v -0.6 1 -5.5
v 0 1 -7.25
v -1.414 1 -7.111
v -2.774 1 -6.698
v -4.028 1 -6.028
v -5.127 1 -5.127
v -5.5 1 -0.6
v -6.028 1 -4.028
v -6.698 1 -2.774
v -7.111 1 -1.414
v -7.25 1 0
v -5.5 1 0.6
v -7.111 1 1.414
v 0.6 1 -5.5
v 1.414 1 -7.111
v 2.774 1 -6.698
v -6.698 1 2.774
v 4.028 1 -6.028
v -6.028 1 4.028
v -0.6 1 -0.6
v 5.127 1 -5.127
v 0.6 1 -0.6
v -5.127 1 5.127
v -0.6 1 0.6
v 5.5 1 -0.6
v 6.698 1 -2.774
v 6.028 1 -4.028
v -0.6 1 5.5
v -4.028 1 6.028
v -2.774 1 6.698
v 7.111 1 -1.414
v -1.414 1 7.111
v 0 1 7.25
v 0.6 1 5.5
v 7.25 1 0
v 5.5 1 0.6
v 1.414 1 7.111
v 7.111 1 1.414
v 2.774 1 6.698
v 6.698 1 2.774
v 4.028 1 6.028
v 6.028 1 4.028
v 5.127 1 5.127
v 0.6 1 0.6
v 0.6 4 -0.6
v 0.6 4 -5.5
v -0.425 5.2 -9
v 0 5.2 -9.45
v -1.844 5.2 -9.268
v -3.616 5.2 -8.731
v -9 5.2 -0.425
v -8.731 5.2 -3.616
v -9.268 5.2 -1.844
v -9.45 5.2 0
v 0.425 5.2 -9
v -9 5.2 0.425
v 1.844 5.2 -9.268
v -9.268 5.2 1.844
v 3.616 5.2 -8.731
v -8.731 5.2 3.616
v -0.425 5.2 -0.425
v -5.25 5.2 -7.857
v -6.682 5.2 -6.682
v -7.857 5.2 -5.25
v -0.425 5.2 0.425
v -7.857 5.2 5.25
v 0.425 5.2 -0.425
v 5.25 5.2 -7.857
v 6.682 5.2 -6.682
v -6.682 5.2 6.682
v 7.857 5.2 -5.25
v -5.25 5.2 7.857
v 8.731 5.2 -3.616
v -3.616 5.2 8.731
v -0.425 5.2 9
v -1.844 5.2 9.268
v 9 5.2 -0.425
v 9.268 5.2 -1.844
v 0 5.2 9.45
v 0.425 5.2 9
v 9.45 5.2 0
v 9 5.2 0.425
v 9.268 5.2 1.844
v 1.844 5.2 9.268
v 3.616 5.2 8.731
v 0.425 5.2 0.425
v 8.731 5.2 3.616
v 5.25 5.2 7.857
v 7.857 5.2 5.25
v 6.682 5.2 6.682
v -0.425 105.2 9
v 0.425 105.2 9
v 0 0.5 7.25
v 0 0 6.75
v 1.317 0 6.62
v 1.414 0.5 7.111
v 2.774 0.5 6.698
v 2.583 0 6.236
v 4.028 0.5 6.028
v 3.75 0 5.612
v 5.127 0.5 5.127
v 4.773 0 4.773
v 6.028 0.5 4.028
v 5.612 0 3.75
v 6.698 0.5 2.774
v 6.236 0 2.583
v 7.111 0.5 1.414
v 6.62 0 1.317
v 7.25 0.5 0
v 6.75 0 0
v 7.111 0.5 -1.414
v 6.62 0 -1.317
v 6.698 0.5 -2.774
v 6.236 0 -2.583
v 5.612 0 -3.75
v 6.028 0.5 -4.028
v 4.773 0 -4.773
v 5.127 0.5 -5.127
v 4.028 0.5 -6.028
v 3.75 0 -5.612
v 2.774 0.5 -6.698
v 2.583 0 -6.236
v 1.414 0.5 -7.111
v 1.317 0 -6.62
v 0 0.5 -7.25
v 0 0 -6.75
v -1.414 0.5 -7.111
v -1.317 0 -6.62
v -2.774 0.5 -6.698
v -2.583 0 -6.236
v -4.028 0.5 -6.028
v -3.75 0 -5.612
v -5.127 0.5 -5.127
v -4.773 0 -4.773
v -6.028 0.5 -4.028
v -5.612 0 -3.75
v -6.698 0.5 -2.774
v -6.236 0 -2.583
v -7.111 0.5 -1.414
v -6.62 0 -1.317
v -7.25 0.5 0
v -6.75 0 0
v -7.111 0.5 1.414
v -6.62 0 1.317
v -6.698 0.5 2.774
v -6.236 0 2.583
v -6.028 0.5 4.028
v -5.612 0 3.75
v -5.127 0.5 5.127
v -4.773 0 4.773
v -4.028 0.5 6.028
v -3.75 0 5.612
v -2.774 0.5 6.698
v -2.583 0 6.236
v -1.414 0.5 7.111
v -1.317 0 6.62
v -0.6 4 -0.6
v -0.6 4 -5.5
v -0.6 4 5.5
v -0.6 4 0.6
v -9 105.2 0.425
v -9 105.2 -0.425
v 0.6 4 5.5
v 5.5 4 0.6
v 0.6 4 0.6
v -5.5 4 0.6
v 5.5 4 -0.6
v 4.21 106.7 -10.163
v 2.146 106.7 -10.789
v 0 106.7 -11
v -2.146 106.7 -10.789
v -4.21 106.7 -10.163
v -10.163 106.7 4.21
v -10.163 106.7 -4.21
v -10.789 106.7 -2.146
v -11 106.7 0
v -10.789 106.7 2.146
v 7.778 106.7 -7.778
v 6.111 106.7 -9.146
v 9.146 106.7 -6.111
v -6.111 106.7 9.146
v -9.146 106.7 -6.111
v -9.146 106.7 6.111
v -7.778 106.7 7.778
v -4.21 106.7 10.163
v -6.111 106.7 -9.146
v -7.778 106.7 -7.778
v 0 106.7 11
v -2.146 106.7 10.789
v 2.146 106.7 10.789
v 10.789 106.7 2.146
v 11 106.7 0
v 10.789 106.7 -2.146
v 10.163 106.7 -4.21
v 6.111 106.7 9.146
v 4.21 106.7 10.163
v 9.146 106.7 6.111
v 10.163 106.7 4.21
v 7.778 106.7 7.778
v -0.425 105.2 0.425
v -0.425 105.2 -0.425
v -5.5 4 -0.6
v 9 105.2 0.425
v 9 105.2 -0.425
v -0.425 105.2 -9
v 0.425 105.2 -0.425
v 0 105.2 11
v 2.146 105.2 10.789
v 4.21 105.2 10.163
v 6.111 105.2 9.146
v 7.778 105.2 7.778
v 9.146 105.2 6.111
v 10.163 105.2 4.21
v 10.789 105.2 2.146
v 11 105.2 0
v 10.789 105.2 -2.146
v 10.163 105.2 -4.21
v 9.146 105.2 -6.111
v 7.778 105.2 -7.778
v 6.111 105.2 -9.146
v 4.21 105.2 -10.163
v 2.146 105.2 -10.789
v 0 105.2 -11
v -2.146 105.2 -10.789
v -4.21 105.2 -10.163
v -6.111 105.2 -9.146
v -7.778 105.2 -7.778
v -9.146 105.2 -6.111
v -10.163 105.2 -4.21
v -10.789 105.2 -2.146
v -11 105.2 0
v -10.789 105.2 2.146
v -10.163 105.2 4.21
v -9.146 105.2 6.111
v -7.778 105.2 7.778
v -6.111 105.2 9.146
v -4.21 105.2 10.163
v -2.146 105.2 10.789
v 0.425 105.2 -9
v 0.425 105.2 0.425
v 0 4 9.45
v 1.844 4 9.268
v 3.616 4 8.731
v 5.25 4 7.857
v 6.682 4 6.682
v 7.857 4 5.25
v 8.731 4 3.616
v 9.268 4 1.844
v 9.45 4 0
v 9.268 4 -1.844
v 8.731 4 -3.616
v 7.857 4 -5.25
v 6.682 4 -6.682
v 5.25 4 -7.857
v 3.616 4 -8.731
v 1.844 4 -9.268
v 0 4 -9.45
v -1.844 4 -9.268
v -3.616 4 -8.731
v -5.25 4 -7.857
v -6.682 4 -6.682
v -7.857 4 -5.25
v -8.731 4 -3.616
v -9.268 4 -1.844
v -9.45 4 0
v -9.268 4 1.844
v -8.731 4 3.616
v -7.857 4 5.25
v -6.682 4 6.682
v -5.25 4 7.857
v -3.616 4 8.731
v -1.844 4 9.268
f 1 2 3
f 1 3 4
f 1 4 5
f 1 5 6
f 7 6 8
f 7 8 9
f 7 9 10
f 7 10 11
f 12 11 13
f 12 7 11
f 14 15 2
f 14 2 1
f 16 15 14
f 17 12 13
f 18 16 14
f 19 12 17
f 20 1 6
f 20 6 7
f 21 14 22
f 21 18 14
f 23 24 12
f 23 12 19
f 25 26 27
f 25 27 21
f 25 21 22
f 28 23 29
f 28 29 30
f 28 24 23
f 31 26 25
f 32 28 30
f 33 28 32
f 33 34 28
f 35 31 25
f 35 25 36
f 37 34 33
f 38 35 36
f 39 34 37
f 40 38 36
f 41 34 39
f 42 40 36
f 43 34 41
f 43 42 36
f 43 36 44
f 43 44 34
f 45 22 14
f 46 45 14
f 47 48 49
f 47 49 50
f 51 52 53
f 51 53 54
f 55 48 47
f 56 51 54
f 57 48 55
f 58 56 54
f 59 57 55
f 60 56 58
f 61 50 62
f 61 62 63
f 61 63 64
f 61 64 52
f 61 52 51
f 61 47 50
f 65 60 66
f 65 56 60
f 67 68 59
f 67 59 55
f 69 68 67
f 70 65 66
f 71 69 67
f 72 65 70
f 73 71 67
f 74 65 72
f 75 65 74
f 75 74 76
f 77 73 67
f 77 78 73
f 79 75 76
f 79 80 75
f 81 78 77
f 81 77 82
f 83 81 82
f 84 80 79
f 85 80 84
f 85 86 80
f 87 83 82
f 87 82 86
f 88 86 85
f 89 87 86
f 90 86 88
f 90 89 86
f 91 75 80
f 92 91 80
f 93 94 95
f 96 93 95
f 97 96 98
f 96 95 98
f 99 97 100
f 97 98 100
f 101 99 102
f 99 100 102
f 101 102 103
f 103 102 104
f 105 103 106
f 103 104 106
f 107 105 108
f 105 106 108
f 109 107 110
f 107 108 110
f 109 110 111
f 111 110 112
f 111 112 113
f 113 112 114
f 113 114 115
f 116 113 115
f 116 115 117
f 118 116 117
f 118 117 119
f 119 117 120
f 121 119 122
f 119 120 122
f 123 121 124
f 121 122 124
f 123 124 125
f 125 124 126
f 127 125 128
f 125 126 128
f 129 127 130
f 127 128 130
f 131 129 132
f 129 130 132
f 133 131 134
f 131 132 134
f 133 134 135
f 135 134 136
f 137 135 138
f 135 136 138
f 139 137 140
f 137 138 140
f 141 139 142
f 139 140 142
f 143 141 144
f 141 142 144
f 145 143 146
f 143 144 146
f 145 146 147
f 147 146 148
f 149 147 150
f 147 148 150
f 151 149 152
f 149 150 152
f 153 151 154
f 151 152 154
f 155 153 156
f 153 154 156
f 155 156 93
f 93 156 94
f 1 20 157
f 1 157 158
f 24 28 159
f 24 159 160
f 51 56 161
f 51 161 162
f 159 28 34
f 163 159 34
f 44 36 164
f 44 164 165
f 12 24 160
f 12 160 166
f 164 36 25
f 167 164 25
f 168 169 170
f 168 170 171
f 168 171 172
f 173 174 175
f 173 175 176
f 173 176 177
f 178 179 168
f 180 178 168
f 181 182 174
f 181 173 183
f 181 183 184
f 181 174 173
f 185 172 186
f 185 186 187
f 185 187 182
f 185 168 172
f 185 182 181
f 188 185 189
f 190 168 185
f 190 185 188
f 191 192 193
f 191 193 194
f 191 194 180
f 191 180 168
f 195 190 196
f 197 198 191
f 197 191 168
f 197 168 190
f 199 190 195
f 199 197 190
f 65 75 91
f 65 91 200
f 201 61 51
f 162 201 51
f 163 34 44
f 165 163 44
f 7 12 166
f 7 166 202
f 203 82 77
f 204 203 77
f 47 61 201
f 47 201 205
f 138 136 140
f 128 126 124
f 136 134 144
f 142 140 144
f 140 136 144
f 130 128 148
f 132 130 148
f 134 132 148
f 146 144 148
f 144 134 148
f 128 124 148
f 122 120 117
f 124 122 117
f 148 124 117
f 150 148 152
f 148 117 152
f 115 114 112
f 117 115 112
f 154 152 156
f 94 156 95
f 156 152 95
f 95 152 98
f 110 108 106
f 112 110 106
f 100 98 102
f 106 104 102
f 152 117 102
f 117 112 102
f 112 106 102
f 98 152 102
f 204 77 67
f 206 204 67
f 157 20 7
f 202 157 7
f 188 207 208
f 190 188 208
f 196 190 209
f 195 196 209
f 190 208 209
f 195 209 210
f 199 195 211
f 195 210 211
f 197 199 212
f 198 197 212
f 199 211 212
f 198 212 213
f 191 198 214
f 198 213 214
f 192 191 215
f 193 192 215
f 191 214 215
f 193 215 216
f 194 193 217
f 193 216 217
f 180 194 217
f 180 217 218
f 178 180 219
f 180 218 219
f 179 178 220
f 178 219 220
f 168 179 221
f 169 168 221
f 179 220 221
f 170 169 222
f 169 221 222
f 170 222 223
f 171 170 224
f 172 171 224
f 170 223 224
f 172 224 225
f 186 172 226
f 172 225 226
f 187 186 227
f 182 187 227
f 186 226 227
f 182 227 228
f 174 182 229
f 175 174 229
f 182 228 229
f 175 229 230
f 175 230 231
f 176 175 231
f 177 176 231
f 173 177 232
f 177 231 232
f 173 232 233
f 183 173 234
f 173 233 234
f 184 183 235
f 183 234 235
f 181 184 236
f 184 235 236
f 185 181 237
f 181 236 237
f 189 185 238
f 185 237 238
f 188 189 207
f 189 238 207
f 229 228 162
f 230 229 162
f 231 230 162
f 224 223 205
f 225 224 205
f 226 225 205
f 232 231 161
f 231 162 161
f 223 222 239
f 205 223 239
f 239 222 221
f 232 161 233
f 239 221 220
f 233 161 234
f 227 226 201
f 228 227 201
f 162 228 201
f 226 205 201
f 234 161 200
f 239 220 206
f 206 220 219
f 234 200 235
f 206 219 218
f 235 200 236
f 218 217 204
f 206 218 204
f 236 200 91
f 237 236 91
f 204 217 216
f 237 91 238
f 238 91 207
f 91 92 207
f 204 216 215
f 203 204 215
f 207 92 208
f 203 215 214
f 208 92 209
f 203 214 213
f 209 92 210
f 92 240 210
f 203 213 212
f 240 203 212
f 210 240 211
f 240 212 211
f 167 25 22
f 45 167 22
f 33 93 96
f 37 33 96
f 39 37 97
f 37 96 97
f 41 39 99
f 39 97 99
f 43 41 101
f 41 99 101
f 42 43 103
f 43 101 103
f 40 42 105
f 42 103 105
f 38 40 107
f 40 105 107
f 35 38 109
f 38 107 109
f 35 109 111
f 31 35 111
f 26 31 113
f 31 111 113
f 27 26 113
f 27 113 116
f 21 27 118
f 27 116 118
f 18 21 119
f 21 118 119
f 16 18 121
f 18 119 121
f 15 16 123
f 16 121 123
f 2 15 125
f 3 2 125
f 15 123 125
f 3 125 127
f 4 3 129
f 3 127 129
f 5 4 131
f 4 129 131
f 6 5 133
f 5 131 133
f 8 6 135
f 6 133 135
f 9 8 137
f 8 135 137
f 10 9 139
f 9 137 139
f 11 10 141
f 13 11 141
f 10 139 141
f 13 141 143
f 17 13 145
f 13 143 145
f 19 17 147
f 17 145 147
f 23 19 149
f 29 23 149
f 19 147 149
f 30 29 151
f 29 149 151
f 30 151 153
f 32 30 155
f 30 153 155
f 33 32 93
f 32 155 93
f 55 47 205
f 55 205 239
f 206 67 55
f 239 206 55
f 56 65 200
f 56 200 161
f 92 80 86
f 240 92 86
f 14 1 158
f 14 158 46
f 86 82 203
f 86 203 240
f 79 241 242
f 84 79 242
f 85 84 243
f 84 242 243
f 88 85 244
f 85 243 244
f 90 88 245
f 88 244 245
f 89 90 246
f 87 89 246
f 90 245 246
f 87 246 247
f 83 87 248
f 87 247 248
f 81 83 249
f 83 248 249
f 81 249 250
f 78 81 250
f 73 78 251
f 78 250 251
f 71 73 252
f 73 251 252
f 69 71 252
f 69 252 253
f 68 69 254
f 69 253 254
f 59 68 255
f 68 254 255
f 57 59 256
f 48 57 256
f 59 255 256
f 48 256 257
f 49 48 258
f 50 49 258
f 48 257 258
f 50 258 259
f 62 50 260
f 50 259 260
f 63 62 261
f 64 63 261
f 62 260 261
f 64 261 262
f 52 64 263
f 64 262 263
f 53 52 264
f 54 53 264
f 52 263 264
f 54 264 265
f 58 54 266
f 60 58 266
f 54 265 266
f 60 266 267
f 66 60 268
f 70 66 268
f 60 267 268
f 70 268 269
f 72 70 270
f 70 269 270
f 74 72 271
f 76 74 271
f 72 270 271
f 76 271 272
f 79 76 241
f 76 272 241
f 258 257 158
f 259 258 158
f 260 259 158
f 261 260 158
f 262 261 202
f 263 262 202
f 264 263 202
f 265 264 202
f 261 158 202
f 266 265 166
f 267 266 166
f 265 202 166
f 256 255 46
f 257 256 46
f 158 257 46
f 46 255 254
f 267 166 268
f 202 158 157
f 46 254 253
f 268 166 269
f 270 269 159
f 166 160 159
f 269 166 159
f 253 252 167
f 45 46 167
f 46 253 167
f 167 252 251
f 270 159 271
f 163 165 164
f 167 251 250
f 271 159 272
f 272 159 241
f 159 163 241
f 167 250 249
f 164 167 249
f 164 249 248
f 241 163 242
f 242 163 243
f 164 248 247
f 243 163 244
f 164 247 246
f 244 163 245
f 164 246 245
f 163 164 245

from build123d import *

# Parameters (mm, degrees)
SKETCH1_R           = 7.25
BOSS_EXTRUDE1_DEPTH = 1
CHAMFER1_SIZE       = 0.5
SKETCH2_W           = 1.2
SKETCH2_H           = 11
BOSS_EXTRUDE2_DEPTH = 3
SKETCH3_R           = 9.45
BOSS_EXTRUDE3_DEPTH = 1.2
SKETCH4_W           = 0.85
SKETCH4_H           = 18
BOSS_EXTRUDE4_DEPTH = 100
CIRPATTERN2_COUNT   = 2
CIRPATTERN2_ANGLE   = 90
SKETCH6_R           = 11
BOSS_EXTRUDE5_DEPTH = 1.5


with BuildPart() as part:
    # Sketch1 → Boss-Extrude1 (new body)
    with BuildSketch(Plane(origin=(0, 0, 0), x_dir=(1, 0, 0), z_dir=(0, 1, 0))):
        with Locations(Location((0, 0, 0), (0, 0, 270))):
            Circle(SKETCH1_R)
    extrude(amount=BOSS_EXTRUDE1_DEPTH)

    # Chamfer1
    chamfer1_edges = [part.edges().sort_by_distance(p)[0] for p in [
        (0, 0, -7.25),
    ]]
    chamfer(chamfer1_edges, length=CHAMFER1_SIZE)

    # Sketch2 → Boss-Extrude2 (add)
    with BuildSketch(Plane(origin=(0, 1, 0), x_dir=(1, 0, 0), z_dir=(0, 1, 0))):
        Rectangle(SKETCH2_W, SKETCH2_H)
    boss_extrude2 = extrude(amount=BOSS_EXTRUDE2_DEPTH)

    # Sketch3 → Boss-Extrude3 (add)
    with BuildSketch(Plane(origin=(0, 4, 0), x_dir=(1, 0, 0), z_dir=(0, 1, 0))):
        with Locations(Location((0, 0, 0), (0, 0, 270))):
            Circle(SKETCH3_R)
    extrude(amount=BOSS_EXTRUDE3_DEPTH)

    # Sketch4 → Boss-Extrude4 (add)
    with BuildSketch(Plane(origin=(0, 5.2, 0), x_dir=(1, 0, 0), z_dir=(0, 1, 0))):
        Rectangle(SKETCH4_W, SKETCH4_H)
    boss_extrude4 = extrude(amount=BOSS_EXTRUDE4_DEPTH)

    # CirPattern2: Boss-Extrude2, Boss-Extrude4 ×2 about axis
    cirpattern2_axis = Axis((0, 0, 0), (0, 1, 0))
    add([boss_extrude2.rotate(cirpattern2_axis, i * CIRPATTERN2_ANGLE / (CIRPATTERN2_COUNT - 1)) for i in range(1, CIRPATTERN2_COUNT)])
    add([boss_extrude4.rotate(cirpattern2_axis, i * CIRPATTERN2_ANGLE / (CIRPATTERN2_COUNT - 1)) for i in range(1, CIRPATTERN2_COUNT)])

    # Sketch6 → Boss-Extrude5 (add)
    with BuildSketch(Plane(origin=(0, 105.2, 0), x_dir=(1, 0, 0), z_dir=(0, 1, 0))):
        with Locations(Location((0, 0, 0), (0, 0, 270))):
            Circle(SKETCH6_R)
    extrude(amount=BOSS_EXTRUDE5_DEPTH)


solid = part.part
